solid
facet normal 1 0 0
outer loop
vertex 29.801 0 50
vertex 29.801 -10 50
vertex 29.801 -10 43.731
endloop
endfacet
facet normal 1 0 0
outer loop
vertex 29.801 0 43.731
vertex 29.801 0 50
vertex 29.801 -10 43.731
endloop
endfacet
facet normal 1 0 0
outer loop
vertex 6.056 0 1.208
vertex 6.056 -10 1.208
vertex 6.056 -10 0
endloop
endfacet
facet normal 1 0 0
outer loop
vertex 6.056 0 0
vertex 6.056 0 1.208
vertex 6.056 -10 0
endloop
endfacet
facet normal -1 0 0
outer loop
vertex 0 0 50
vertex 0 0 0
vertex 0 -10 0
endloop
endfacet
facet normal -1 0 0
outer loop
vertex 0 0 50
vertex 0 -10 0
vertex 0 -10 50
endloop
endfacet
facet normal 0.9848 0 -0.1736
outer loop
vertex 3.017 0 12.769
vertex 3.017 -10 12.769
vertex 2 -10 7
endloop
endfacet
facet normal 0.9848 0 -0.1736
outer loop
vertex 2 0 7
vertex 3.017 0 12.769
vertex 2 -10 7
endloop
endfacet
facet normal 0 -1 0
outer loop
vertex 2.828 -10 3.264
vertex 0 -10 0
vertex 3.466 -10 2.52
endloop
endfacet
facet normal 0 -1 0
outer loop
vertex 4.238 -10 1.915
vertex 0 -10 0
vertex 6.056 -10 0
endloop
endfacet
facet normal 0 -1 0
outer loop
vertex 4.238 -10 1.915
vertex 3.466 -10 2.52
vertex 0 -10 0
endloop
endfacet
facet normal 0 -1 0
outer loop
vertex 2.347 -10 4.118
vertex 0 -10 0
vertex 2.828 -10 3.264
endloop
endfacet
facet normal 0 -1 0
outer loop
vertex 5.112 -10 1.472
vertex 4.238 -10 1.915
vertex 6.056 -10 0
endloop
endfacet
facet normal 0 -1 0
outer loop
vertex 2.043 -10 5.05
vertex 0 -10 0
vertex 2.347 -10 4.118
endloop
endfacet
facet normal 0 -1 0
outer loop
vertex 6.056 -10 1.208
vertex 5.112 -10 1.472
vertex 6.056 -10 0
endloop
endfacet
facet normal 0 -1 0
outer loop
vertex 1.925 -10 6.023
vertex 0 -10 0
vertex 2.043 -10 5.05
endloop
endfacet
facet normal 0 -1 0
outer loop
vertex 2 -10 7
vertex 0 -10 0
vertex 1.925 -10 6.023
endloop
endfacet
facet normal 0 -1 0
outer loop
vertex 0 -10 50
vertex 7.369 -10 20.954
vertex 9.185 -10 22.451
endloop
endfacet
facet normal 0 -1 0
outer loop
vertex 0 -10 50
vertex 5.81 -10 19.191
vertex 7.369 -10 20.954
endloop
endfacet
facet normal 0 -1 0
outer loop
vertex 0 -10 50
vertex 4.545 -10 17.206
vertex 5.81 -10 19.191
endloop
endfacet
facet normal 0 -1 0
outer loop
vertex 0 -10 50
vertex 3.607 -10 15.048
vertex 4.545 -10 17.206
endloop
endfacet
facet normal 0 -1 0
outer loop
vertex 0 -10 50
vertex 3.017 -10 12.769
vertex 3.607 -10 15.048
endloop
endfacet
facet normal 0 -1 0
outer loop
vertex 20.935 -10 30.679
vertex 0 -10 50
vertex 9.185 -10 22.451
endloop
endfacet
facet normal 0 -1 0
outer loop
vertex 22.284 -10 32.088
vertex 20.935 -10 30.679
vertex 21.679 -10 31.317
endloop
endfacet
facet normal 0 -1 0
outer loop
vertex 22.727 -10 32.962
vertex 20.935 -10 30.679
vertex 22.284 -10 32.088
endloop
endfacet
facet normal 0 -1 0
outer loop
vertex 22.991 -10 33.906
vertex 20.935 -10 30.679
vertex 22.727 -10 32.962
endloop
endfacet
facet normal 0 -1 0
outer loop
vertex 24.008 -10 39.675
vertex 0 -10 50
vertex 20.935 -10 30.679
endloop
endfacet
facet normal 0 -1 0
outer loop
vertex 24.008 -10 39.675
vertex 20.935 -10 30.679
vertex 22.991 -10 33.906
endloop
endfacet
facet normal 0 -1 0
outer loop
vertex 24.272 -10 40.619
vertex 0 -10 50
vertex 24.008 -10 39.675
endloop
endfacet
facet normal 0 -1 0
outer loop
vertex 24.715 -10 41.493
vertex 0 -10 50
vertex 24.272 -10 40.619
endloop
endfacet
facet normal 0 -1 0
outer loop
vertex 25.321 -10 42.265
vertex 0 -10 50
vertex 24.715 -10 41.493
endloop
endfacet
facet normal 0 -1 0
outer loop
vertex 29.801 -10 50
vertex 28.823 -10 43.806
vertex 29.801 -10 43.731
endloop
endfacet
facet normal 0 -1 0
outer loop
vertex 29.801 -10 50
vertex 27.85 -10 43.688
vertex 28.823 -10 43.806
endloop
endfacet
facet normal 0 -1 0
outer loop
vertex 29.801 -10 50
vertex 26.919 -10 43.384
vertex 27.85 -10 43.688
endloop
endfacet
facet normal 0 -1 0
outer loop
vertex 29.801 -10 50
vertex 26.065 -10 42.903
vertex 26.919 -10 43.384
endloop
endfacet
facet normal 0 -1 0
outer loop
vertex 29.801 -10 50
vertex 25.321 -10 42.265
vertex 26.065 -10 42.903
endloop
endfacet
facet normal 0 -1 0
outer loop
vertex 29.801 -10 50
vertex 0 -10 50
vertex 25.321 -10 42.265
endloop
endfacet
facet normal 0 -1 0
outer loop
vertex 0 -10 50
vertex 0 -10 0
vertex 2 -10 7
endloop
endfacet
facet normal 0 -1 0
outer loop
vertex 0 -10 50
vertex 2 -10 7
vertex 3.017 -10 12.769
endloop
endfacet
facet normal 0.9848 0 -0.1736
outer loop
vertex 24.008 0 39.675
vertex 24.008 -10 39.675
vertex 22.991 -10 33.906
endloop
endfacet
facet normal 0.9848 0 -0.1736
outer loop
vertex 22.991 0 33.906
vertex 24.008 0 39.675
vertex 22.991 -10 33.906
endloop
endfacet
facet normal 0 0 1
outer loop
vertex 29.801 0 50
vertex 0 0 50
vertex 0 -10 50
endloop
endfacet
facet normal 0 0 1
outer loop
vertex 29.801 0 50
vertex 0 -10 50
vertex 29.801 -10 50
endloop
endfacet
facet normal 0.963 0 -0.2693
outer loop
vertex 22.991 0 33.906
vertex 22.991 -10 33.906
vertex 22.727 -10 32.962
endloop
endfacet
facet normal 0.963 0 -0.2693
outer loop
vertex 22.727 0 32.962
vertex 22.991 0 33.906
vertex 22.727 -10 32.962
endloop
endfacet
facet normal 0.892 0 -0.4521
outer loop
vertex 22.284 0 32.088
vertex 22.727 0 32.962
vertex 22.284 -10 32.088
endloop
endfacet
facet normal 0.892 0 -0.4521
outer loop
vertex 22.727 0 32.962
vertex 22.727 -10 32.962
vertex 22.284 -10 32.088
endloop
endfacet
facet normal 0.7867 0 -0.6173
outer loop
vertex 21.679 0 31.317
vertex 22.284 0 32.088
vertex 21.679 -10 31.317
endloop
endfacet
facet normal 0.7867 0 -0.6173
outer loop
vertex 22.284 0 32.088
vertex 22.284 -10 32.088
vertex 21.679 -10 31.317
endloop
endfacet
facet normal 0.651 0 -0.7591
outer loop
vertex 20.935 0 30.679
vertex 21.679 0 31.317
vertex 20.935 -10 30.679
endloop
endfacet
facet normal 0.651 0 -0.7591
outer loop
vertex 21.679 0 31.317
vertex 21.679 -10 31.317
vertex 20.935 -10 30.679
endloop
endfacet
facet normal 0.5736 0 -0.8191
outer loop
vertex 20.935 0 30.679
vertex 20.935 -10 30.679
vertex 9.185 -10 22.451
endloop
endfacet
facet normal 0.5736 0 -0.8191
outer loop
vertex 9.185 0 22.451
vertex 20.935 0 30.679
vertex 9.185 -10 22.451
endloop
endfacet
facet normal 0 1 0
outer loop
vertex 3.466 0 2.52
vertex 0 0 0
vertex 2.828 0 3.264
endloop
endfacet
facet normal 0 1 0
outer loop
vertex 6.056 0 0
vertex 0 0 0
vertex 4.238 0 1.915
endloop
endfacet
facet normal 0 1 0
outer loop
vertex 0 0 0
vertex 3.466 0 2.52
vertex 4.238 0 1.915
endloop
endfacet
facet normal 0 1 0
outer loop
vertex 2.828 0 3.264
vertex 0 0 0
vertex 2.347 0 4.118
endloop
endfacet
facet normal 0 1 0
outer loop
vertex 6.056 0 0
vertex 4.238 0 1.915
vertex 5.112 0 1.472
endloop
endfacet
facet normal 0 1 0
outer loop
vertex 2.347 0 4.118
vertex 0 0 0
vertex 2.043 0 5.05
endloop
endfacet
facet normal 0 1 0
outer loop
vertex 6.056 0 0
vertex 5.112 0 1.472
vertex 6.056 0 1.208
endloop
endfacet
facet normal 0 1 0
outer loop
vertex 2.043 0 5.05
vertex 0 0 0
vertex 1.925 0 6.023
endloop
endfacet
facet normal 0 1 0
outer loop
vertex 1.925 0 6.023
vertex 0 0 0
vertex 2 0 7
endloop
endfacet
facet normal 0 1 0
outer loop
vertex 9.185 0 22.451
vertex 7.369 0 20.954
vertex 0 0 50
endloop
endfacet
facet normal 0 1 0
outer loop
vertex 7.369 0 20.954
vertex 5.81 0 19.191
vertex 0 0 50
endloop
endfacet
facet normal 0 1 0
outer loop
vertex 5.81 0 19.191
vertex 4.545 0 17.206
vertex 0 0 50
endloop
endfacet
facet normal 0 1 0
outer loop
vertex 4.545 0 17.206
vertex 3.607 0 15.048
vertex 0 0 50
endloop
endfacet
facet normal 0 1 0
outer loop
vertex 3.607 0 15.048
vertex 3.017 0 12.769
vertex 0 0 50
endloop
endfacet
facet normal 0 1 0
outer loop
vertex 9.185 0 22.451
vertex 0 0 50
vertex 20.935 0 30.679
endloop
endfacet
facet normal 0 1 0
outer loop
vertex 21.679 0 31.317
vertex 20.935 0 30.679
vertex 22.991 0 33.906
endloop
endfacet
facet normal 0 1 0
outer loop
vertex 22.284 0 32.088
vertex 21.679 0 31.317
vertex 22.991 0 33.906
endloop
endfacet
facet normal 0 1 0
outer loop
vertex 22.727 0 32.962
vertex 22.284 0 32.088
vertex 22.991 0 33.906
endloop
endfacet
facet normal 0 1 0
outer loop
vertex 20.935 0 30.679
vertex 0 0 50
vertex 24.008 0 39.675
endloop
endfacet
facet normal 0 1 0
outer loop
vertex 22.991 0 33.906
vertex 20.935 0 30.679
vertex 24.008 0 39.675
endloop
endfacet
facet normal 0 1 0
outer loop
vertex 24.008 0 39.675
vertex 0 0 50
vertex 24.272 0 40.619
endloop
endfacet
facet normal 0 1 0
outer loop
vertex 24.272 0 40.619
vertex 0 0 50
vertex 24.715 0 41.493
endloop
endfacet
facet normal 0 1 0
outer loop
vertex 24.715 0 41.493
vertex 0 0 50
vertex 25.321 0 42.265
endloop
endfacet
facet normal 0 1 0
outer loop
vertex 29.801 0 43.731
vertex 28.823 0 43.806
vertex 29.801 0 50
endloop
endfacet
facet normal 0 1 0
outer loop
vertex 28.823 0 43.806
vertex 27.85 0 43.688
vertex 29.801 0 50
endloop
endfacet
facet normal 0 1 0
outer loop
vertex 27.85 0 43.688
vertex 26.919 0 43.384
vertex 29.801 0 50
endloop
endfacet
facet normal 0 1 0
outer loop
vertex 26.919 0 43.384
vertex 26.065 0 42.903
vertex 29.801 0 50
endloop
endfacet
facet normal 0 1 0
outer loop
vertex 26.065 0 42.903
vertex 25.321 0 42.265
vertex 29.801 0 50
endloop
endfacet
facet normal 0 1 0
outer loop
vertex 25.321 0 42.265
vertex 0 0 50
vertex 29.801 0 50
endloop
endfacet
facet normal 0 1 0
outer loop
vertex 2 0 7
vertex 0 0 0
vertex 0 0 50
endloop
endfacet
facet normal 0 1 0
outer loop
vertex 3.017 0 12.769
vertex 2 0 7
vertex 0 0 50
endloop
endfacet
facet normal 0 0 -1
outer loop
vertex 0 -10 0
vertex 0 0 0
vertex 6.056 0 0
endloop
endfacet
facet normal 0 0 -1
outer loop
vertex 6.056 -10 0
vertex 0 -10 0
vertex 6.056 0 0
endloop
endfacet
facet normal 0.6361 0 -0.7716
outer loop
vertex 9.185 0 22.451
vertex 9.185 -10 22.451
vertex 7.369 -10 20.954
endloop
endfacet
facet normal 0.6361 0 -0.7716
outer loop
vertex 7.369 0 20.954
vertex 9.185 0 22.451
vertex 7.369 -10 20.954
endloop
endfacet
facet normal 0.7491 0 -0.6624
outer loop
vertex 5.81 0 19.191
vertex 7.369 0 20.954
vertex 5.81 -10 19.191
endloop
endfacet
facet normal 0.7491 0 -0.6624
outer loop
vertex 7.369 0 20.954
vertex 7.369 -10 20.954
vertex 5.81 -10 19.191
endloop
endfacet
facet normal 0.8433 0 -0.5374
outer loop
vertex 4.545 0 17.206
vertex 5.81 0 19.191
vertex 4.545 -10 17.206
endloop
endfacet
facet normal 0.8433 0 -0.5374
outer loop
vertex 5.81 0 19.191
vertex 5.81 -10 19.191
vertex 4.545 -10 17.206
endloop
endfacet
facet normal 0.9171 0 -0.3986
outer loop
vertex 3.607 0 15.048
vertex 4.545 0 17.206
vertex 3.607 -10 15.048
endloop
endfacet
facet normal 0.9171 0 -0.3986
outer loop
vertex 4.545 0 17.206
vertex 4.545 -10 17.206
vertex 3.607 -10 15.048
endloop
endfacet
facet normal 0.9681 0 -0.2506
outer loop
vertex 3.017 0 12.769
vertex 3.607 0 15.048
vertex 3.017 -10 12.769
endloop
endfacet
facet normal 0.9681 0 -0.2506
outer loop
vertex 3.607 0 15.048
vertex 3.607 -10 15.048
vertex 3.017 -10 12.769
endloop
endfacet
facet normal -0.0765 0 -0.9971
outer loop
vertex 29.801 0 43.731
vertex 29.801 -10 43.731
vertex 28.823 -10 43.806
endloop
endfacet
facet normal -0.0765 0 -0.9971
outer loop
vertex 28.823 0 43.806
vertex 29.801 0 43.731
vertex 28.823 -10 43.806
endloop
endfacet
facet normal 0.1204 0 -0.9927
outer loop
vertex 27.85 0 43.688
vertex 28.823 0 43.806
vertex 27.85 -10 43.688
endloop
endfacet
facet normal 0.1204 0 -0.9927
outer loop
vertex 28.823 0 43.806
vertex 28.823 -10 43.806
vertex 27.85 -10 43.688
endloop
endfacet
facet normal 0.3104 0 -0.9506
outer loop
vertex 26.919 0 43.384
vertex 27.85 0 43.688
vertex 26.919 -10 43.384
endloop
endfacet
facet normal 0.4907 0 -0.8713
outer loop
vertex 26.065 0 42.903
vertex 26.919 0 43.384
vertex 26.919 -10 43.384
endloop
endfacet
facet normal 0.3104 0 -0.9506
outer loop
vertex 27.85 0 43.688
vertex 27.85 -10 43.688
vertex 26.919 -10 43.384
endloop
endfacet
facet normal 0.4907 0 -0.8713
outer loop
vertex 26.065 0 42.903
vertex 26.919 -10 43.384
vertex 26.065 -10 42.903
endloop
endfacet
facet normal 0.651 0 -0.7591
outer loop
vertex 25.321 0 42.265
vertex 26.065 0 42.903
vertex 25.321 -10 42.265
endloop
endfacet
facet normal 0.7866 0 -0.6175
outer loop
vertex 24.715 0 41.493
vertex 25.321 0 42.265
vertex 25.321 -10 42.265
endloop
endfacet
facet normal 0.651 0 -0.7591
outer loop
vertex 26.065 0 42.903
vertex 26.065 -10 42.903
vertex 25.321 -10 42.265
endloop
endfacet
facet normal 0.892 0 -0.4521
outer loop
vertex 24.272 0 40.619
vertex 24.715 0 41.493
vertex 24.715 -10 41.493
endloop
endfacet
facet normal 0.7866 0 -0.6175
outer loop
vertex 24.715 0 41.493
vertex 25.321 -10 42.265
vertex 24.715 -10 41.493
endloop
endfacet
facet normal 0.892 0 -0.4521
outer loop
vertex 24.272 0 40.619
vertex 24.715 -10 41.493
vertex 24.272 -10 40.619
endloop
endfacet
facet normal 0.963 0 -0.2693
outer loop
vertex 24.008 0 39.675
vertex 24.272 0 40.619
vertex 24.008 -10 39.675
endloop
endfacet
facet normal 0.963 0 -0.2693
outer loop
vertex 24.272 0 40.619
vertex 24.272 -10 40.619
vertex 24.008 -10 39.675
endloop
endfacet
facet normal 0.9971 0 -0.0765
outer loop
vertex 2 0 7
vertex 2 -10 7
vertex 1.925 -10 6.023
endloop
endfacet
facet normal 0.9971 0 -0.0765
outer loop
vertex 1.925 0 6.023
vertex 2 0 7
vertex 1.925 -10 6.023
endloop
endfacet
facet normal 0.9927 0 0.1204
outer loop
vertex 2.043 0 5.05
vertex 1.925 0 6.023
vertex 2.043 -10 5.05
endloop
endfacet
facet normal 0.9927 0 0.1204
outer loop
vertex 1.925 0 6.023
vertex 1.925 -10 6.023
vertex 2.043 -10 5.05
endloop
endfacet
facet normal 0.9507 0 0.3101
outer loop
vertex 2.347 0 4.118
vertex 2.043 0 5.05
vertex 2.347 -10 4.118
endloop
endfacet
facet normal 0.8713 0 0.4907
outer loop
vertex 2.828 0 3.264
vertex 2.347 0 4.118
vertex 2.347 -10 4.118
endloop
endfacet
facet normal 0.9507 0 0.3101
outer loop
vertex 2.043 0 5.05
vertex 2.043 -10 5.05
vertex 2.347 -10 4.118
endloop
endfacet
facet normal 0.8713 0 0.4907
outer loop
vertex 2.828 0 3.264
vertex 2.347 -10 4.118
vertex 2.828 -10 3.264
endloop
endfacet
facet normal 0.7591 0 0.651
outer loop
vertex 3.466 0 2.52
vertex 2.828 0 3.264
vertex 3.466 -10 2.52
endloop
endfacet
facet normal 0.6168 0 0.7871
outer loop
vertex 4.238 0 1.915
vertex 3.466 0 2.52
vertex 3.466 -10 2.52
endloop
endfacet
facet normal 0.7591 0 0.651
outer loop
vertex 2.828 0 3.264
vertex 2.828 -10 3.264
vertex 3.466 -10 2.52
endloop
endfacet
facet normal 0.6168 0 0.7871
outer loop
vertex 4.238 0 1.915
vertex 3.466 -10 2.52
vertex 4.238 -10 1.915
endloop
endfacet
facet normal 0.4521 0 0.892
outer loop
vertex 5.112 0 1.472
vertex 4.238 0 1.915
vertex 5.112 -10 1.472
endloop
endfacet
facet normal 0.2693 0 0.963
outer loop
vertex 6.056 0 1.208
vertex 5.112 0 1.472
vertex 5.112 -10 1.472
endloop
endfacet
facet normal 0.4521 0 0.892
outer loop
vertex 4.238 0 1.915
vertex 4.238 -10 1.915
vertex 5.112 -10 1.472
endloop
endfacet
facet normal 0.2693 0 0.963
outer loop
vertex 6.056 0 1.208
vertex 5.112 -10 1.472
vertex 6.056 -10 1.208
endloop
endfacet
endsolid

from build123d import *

# Parameters (mm, degrees)
F0_W     = 40
F0_H     = 50
F1_DEPTH = 10
F3_DEPTH = 10.001


with BuildPart() as f1:
    # F0 (on Front) → F1 (new body)
    with BuildSketch(Plane.XZ):
        with Locations((20, 25)):
            Rectangle(F0_W, F0_H)
    extrude(amount=F1_DEPTH)

    # F2 (on face) → F3 (cut, through all)
    with BuildSketch(Plane.XZ.offset(10)):
        with BuildLine():
            Line((3.017207, 12.76887), (2, 7))
            ThreePointArc((2, 7), (2.828279, 3.263877), (6.055798, 1.20772))
            Line((6.055798, 1.20772), (6.055798, 0))
            Line((6.055798, 0), (40, 0))
            Line((40, 0), (40, 50))
            Line((40, 50), (29.800625, 50))
            Line((29.800625, 50), (29.800625, 43.731))
            ThreePointArc((29.800625, 43.731), (26.064502, 42.902721), (24.008346, 39.675202))
            Line((24.008346, 39.675202), (22.991119, 33.906221))
            ThreePointArc((22.991119, 33.906221), (22.284063, 32.088005), (20.935041, 30.678757))
            Line((20.935041, 30.678757), (9.185442, 22.451263))
            ThreePointArc((9.185442, 22.451263), (5.138375, 18.22352), (3.017207, 12.76887))
        make_face()
    extrude(amount=-F3_DEPTH, mode=Mode.SUBTRACT)


solid = f1.part
